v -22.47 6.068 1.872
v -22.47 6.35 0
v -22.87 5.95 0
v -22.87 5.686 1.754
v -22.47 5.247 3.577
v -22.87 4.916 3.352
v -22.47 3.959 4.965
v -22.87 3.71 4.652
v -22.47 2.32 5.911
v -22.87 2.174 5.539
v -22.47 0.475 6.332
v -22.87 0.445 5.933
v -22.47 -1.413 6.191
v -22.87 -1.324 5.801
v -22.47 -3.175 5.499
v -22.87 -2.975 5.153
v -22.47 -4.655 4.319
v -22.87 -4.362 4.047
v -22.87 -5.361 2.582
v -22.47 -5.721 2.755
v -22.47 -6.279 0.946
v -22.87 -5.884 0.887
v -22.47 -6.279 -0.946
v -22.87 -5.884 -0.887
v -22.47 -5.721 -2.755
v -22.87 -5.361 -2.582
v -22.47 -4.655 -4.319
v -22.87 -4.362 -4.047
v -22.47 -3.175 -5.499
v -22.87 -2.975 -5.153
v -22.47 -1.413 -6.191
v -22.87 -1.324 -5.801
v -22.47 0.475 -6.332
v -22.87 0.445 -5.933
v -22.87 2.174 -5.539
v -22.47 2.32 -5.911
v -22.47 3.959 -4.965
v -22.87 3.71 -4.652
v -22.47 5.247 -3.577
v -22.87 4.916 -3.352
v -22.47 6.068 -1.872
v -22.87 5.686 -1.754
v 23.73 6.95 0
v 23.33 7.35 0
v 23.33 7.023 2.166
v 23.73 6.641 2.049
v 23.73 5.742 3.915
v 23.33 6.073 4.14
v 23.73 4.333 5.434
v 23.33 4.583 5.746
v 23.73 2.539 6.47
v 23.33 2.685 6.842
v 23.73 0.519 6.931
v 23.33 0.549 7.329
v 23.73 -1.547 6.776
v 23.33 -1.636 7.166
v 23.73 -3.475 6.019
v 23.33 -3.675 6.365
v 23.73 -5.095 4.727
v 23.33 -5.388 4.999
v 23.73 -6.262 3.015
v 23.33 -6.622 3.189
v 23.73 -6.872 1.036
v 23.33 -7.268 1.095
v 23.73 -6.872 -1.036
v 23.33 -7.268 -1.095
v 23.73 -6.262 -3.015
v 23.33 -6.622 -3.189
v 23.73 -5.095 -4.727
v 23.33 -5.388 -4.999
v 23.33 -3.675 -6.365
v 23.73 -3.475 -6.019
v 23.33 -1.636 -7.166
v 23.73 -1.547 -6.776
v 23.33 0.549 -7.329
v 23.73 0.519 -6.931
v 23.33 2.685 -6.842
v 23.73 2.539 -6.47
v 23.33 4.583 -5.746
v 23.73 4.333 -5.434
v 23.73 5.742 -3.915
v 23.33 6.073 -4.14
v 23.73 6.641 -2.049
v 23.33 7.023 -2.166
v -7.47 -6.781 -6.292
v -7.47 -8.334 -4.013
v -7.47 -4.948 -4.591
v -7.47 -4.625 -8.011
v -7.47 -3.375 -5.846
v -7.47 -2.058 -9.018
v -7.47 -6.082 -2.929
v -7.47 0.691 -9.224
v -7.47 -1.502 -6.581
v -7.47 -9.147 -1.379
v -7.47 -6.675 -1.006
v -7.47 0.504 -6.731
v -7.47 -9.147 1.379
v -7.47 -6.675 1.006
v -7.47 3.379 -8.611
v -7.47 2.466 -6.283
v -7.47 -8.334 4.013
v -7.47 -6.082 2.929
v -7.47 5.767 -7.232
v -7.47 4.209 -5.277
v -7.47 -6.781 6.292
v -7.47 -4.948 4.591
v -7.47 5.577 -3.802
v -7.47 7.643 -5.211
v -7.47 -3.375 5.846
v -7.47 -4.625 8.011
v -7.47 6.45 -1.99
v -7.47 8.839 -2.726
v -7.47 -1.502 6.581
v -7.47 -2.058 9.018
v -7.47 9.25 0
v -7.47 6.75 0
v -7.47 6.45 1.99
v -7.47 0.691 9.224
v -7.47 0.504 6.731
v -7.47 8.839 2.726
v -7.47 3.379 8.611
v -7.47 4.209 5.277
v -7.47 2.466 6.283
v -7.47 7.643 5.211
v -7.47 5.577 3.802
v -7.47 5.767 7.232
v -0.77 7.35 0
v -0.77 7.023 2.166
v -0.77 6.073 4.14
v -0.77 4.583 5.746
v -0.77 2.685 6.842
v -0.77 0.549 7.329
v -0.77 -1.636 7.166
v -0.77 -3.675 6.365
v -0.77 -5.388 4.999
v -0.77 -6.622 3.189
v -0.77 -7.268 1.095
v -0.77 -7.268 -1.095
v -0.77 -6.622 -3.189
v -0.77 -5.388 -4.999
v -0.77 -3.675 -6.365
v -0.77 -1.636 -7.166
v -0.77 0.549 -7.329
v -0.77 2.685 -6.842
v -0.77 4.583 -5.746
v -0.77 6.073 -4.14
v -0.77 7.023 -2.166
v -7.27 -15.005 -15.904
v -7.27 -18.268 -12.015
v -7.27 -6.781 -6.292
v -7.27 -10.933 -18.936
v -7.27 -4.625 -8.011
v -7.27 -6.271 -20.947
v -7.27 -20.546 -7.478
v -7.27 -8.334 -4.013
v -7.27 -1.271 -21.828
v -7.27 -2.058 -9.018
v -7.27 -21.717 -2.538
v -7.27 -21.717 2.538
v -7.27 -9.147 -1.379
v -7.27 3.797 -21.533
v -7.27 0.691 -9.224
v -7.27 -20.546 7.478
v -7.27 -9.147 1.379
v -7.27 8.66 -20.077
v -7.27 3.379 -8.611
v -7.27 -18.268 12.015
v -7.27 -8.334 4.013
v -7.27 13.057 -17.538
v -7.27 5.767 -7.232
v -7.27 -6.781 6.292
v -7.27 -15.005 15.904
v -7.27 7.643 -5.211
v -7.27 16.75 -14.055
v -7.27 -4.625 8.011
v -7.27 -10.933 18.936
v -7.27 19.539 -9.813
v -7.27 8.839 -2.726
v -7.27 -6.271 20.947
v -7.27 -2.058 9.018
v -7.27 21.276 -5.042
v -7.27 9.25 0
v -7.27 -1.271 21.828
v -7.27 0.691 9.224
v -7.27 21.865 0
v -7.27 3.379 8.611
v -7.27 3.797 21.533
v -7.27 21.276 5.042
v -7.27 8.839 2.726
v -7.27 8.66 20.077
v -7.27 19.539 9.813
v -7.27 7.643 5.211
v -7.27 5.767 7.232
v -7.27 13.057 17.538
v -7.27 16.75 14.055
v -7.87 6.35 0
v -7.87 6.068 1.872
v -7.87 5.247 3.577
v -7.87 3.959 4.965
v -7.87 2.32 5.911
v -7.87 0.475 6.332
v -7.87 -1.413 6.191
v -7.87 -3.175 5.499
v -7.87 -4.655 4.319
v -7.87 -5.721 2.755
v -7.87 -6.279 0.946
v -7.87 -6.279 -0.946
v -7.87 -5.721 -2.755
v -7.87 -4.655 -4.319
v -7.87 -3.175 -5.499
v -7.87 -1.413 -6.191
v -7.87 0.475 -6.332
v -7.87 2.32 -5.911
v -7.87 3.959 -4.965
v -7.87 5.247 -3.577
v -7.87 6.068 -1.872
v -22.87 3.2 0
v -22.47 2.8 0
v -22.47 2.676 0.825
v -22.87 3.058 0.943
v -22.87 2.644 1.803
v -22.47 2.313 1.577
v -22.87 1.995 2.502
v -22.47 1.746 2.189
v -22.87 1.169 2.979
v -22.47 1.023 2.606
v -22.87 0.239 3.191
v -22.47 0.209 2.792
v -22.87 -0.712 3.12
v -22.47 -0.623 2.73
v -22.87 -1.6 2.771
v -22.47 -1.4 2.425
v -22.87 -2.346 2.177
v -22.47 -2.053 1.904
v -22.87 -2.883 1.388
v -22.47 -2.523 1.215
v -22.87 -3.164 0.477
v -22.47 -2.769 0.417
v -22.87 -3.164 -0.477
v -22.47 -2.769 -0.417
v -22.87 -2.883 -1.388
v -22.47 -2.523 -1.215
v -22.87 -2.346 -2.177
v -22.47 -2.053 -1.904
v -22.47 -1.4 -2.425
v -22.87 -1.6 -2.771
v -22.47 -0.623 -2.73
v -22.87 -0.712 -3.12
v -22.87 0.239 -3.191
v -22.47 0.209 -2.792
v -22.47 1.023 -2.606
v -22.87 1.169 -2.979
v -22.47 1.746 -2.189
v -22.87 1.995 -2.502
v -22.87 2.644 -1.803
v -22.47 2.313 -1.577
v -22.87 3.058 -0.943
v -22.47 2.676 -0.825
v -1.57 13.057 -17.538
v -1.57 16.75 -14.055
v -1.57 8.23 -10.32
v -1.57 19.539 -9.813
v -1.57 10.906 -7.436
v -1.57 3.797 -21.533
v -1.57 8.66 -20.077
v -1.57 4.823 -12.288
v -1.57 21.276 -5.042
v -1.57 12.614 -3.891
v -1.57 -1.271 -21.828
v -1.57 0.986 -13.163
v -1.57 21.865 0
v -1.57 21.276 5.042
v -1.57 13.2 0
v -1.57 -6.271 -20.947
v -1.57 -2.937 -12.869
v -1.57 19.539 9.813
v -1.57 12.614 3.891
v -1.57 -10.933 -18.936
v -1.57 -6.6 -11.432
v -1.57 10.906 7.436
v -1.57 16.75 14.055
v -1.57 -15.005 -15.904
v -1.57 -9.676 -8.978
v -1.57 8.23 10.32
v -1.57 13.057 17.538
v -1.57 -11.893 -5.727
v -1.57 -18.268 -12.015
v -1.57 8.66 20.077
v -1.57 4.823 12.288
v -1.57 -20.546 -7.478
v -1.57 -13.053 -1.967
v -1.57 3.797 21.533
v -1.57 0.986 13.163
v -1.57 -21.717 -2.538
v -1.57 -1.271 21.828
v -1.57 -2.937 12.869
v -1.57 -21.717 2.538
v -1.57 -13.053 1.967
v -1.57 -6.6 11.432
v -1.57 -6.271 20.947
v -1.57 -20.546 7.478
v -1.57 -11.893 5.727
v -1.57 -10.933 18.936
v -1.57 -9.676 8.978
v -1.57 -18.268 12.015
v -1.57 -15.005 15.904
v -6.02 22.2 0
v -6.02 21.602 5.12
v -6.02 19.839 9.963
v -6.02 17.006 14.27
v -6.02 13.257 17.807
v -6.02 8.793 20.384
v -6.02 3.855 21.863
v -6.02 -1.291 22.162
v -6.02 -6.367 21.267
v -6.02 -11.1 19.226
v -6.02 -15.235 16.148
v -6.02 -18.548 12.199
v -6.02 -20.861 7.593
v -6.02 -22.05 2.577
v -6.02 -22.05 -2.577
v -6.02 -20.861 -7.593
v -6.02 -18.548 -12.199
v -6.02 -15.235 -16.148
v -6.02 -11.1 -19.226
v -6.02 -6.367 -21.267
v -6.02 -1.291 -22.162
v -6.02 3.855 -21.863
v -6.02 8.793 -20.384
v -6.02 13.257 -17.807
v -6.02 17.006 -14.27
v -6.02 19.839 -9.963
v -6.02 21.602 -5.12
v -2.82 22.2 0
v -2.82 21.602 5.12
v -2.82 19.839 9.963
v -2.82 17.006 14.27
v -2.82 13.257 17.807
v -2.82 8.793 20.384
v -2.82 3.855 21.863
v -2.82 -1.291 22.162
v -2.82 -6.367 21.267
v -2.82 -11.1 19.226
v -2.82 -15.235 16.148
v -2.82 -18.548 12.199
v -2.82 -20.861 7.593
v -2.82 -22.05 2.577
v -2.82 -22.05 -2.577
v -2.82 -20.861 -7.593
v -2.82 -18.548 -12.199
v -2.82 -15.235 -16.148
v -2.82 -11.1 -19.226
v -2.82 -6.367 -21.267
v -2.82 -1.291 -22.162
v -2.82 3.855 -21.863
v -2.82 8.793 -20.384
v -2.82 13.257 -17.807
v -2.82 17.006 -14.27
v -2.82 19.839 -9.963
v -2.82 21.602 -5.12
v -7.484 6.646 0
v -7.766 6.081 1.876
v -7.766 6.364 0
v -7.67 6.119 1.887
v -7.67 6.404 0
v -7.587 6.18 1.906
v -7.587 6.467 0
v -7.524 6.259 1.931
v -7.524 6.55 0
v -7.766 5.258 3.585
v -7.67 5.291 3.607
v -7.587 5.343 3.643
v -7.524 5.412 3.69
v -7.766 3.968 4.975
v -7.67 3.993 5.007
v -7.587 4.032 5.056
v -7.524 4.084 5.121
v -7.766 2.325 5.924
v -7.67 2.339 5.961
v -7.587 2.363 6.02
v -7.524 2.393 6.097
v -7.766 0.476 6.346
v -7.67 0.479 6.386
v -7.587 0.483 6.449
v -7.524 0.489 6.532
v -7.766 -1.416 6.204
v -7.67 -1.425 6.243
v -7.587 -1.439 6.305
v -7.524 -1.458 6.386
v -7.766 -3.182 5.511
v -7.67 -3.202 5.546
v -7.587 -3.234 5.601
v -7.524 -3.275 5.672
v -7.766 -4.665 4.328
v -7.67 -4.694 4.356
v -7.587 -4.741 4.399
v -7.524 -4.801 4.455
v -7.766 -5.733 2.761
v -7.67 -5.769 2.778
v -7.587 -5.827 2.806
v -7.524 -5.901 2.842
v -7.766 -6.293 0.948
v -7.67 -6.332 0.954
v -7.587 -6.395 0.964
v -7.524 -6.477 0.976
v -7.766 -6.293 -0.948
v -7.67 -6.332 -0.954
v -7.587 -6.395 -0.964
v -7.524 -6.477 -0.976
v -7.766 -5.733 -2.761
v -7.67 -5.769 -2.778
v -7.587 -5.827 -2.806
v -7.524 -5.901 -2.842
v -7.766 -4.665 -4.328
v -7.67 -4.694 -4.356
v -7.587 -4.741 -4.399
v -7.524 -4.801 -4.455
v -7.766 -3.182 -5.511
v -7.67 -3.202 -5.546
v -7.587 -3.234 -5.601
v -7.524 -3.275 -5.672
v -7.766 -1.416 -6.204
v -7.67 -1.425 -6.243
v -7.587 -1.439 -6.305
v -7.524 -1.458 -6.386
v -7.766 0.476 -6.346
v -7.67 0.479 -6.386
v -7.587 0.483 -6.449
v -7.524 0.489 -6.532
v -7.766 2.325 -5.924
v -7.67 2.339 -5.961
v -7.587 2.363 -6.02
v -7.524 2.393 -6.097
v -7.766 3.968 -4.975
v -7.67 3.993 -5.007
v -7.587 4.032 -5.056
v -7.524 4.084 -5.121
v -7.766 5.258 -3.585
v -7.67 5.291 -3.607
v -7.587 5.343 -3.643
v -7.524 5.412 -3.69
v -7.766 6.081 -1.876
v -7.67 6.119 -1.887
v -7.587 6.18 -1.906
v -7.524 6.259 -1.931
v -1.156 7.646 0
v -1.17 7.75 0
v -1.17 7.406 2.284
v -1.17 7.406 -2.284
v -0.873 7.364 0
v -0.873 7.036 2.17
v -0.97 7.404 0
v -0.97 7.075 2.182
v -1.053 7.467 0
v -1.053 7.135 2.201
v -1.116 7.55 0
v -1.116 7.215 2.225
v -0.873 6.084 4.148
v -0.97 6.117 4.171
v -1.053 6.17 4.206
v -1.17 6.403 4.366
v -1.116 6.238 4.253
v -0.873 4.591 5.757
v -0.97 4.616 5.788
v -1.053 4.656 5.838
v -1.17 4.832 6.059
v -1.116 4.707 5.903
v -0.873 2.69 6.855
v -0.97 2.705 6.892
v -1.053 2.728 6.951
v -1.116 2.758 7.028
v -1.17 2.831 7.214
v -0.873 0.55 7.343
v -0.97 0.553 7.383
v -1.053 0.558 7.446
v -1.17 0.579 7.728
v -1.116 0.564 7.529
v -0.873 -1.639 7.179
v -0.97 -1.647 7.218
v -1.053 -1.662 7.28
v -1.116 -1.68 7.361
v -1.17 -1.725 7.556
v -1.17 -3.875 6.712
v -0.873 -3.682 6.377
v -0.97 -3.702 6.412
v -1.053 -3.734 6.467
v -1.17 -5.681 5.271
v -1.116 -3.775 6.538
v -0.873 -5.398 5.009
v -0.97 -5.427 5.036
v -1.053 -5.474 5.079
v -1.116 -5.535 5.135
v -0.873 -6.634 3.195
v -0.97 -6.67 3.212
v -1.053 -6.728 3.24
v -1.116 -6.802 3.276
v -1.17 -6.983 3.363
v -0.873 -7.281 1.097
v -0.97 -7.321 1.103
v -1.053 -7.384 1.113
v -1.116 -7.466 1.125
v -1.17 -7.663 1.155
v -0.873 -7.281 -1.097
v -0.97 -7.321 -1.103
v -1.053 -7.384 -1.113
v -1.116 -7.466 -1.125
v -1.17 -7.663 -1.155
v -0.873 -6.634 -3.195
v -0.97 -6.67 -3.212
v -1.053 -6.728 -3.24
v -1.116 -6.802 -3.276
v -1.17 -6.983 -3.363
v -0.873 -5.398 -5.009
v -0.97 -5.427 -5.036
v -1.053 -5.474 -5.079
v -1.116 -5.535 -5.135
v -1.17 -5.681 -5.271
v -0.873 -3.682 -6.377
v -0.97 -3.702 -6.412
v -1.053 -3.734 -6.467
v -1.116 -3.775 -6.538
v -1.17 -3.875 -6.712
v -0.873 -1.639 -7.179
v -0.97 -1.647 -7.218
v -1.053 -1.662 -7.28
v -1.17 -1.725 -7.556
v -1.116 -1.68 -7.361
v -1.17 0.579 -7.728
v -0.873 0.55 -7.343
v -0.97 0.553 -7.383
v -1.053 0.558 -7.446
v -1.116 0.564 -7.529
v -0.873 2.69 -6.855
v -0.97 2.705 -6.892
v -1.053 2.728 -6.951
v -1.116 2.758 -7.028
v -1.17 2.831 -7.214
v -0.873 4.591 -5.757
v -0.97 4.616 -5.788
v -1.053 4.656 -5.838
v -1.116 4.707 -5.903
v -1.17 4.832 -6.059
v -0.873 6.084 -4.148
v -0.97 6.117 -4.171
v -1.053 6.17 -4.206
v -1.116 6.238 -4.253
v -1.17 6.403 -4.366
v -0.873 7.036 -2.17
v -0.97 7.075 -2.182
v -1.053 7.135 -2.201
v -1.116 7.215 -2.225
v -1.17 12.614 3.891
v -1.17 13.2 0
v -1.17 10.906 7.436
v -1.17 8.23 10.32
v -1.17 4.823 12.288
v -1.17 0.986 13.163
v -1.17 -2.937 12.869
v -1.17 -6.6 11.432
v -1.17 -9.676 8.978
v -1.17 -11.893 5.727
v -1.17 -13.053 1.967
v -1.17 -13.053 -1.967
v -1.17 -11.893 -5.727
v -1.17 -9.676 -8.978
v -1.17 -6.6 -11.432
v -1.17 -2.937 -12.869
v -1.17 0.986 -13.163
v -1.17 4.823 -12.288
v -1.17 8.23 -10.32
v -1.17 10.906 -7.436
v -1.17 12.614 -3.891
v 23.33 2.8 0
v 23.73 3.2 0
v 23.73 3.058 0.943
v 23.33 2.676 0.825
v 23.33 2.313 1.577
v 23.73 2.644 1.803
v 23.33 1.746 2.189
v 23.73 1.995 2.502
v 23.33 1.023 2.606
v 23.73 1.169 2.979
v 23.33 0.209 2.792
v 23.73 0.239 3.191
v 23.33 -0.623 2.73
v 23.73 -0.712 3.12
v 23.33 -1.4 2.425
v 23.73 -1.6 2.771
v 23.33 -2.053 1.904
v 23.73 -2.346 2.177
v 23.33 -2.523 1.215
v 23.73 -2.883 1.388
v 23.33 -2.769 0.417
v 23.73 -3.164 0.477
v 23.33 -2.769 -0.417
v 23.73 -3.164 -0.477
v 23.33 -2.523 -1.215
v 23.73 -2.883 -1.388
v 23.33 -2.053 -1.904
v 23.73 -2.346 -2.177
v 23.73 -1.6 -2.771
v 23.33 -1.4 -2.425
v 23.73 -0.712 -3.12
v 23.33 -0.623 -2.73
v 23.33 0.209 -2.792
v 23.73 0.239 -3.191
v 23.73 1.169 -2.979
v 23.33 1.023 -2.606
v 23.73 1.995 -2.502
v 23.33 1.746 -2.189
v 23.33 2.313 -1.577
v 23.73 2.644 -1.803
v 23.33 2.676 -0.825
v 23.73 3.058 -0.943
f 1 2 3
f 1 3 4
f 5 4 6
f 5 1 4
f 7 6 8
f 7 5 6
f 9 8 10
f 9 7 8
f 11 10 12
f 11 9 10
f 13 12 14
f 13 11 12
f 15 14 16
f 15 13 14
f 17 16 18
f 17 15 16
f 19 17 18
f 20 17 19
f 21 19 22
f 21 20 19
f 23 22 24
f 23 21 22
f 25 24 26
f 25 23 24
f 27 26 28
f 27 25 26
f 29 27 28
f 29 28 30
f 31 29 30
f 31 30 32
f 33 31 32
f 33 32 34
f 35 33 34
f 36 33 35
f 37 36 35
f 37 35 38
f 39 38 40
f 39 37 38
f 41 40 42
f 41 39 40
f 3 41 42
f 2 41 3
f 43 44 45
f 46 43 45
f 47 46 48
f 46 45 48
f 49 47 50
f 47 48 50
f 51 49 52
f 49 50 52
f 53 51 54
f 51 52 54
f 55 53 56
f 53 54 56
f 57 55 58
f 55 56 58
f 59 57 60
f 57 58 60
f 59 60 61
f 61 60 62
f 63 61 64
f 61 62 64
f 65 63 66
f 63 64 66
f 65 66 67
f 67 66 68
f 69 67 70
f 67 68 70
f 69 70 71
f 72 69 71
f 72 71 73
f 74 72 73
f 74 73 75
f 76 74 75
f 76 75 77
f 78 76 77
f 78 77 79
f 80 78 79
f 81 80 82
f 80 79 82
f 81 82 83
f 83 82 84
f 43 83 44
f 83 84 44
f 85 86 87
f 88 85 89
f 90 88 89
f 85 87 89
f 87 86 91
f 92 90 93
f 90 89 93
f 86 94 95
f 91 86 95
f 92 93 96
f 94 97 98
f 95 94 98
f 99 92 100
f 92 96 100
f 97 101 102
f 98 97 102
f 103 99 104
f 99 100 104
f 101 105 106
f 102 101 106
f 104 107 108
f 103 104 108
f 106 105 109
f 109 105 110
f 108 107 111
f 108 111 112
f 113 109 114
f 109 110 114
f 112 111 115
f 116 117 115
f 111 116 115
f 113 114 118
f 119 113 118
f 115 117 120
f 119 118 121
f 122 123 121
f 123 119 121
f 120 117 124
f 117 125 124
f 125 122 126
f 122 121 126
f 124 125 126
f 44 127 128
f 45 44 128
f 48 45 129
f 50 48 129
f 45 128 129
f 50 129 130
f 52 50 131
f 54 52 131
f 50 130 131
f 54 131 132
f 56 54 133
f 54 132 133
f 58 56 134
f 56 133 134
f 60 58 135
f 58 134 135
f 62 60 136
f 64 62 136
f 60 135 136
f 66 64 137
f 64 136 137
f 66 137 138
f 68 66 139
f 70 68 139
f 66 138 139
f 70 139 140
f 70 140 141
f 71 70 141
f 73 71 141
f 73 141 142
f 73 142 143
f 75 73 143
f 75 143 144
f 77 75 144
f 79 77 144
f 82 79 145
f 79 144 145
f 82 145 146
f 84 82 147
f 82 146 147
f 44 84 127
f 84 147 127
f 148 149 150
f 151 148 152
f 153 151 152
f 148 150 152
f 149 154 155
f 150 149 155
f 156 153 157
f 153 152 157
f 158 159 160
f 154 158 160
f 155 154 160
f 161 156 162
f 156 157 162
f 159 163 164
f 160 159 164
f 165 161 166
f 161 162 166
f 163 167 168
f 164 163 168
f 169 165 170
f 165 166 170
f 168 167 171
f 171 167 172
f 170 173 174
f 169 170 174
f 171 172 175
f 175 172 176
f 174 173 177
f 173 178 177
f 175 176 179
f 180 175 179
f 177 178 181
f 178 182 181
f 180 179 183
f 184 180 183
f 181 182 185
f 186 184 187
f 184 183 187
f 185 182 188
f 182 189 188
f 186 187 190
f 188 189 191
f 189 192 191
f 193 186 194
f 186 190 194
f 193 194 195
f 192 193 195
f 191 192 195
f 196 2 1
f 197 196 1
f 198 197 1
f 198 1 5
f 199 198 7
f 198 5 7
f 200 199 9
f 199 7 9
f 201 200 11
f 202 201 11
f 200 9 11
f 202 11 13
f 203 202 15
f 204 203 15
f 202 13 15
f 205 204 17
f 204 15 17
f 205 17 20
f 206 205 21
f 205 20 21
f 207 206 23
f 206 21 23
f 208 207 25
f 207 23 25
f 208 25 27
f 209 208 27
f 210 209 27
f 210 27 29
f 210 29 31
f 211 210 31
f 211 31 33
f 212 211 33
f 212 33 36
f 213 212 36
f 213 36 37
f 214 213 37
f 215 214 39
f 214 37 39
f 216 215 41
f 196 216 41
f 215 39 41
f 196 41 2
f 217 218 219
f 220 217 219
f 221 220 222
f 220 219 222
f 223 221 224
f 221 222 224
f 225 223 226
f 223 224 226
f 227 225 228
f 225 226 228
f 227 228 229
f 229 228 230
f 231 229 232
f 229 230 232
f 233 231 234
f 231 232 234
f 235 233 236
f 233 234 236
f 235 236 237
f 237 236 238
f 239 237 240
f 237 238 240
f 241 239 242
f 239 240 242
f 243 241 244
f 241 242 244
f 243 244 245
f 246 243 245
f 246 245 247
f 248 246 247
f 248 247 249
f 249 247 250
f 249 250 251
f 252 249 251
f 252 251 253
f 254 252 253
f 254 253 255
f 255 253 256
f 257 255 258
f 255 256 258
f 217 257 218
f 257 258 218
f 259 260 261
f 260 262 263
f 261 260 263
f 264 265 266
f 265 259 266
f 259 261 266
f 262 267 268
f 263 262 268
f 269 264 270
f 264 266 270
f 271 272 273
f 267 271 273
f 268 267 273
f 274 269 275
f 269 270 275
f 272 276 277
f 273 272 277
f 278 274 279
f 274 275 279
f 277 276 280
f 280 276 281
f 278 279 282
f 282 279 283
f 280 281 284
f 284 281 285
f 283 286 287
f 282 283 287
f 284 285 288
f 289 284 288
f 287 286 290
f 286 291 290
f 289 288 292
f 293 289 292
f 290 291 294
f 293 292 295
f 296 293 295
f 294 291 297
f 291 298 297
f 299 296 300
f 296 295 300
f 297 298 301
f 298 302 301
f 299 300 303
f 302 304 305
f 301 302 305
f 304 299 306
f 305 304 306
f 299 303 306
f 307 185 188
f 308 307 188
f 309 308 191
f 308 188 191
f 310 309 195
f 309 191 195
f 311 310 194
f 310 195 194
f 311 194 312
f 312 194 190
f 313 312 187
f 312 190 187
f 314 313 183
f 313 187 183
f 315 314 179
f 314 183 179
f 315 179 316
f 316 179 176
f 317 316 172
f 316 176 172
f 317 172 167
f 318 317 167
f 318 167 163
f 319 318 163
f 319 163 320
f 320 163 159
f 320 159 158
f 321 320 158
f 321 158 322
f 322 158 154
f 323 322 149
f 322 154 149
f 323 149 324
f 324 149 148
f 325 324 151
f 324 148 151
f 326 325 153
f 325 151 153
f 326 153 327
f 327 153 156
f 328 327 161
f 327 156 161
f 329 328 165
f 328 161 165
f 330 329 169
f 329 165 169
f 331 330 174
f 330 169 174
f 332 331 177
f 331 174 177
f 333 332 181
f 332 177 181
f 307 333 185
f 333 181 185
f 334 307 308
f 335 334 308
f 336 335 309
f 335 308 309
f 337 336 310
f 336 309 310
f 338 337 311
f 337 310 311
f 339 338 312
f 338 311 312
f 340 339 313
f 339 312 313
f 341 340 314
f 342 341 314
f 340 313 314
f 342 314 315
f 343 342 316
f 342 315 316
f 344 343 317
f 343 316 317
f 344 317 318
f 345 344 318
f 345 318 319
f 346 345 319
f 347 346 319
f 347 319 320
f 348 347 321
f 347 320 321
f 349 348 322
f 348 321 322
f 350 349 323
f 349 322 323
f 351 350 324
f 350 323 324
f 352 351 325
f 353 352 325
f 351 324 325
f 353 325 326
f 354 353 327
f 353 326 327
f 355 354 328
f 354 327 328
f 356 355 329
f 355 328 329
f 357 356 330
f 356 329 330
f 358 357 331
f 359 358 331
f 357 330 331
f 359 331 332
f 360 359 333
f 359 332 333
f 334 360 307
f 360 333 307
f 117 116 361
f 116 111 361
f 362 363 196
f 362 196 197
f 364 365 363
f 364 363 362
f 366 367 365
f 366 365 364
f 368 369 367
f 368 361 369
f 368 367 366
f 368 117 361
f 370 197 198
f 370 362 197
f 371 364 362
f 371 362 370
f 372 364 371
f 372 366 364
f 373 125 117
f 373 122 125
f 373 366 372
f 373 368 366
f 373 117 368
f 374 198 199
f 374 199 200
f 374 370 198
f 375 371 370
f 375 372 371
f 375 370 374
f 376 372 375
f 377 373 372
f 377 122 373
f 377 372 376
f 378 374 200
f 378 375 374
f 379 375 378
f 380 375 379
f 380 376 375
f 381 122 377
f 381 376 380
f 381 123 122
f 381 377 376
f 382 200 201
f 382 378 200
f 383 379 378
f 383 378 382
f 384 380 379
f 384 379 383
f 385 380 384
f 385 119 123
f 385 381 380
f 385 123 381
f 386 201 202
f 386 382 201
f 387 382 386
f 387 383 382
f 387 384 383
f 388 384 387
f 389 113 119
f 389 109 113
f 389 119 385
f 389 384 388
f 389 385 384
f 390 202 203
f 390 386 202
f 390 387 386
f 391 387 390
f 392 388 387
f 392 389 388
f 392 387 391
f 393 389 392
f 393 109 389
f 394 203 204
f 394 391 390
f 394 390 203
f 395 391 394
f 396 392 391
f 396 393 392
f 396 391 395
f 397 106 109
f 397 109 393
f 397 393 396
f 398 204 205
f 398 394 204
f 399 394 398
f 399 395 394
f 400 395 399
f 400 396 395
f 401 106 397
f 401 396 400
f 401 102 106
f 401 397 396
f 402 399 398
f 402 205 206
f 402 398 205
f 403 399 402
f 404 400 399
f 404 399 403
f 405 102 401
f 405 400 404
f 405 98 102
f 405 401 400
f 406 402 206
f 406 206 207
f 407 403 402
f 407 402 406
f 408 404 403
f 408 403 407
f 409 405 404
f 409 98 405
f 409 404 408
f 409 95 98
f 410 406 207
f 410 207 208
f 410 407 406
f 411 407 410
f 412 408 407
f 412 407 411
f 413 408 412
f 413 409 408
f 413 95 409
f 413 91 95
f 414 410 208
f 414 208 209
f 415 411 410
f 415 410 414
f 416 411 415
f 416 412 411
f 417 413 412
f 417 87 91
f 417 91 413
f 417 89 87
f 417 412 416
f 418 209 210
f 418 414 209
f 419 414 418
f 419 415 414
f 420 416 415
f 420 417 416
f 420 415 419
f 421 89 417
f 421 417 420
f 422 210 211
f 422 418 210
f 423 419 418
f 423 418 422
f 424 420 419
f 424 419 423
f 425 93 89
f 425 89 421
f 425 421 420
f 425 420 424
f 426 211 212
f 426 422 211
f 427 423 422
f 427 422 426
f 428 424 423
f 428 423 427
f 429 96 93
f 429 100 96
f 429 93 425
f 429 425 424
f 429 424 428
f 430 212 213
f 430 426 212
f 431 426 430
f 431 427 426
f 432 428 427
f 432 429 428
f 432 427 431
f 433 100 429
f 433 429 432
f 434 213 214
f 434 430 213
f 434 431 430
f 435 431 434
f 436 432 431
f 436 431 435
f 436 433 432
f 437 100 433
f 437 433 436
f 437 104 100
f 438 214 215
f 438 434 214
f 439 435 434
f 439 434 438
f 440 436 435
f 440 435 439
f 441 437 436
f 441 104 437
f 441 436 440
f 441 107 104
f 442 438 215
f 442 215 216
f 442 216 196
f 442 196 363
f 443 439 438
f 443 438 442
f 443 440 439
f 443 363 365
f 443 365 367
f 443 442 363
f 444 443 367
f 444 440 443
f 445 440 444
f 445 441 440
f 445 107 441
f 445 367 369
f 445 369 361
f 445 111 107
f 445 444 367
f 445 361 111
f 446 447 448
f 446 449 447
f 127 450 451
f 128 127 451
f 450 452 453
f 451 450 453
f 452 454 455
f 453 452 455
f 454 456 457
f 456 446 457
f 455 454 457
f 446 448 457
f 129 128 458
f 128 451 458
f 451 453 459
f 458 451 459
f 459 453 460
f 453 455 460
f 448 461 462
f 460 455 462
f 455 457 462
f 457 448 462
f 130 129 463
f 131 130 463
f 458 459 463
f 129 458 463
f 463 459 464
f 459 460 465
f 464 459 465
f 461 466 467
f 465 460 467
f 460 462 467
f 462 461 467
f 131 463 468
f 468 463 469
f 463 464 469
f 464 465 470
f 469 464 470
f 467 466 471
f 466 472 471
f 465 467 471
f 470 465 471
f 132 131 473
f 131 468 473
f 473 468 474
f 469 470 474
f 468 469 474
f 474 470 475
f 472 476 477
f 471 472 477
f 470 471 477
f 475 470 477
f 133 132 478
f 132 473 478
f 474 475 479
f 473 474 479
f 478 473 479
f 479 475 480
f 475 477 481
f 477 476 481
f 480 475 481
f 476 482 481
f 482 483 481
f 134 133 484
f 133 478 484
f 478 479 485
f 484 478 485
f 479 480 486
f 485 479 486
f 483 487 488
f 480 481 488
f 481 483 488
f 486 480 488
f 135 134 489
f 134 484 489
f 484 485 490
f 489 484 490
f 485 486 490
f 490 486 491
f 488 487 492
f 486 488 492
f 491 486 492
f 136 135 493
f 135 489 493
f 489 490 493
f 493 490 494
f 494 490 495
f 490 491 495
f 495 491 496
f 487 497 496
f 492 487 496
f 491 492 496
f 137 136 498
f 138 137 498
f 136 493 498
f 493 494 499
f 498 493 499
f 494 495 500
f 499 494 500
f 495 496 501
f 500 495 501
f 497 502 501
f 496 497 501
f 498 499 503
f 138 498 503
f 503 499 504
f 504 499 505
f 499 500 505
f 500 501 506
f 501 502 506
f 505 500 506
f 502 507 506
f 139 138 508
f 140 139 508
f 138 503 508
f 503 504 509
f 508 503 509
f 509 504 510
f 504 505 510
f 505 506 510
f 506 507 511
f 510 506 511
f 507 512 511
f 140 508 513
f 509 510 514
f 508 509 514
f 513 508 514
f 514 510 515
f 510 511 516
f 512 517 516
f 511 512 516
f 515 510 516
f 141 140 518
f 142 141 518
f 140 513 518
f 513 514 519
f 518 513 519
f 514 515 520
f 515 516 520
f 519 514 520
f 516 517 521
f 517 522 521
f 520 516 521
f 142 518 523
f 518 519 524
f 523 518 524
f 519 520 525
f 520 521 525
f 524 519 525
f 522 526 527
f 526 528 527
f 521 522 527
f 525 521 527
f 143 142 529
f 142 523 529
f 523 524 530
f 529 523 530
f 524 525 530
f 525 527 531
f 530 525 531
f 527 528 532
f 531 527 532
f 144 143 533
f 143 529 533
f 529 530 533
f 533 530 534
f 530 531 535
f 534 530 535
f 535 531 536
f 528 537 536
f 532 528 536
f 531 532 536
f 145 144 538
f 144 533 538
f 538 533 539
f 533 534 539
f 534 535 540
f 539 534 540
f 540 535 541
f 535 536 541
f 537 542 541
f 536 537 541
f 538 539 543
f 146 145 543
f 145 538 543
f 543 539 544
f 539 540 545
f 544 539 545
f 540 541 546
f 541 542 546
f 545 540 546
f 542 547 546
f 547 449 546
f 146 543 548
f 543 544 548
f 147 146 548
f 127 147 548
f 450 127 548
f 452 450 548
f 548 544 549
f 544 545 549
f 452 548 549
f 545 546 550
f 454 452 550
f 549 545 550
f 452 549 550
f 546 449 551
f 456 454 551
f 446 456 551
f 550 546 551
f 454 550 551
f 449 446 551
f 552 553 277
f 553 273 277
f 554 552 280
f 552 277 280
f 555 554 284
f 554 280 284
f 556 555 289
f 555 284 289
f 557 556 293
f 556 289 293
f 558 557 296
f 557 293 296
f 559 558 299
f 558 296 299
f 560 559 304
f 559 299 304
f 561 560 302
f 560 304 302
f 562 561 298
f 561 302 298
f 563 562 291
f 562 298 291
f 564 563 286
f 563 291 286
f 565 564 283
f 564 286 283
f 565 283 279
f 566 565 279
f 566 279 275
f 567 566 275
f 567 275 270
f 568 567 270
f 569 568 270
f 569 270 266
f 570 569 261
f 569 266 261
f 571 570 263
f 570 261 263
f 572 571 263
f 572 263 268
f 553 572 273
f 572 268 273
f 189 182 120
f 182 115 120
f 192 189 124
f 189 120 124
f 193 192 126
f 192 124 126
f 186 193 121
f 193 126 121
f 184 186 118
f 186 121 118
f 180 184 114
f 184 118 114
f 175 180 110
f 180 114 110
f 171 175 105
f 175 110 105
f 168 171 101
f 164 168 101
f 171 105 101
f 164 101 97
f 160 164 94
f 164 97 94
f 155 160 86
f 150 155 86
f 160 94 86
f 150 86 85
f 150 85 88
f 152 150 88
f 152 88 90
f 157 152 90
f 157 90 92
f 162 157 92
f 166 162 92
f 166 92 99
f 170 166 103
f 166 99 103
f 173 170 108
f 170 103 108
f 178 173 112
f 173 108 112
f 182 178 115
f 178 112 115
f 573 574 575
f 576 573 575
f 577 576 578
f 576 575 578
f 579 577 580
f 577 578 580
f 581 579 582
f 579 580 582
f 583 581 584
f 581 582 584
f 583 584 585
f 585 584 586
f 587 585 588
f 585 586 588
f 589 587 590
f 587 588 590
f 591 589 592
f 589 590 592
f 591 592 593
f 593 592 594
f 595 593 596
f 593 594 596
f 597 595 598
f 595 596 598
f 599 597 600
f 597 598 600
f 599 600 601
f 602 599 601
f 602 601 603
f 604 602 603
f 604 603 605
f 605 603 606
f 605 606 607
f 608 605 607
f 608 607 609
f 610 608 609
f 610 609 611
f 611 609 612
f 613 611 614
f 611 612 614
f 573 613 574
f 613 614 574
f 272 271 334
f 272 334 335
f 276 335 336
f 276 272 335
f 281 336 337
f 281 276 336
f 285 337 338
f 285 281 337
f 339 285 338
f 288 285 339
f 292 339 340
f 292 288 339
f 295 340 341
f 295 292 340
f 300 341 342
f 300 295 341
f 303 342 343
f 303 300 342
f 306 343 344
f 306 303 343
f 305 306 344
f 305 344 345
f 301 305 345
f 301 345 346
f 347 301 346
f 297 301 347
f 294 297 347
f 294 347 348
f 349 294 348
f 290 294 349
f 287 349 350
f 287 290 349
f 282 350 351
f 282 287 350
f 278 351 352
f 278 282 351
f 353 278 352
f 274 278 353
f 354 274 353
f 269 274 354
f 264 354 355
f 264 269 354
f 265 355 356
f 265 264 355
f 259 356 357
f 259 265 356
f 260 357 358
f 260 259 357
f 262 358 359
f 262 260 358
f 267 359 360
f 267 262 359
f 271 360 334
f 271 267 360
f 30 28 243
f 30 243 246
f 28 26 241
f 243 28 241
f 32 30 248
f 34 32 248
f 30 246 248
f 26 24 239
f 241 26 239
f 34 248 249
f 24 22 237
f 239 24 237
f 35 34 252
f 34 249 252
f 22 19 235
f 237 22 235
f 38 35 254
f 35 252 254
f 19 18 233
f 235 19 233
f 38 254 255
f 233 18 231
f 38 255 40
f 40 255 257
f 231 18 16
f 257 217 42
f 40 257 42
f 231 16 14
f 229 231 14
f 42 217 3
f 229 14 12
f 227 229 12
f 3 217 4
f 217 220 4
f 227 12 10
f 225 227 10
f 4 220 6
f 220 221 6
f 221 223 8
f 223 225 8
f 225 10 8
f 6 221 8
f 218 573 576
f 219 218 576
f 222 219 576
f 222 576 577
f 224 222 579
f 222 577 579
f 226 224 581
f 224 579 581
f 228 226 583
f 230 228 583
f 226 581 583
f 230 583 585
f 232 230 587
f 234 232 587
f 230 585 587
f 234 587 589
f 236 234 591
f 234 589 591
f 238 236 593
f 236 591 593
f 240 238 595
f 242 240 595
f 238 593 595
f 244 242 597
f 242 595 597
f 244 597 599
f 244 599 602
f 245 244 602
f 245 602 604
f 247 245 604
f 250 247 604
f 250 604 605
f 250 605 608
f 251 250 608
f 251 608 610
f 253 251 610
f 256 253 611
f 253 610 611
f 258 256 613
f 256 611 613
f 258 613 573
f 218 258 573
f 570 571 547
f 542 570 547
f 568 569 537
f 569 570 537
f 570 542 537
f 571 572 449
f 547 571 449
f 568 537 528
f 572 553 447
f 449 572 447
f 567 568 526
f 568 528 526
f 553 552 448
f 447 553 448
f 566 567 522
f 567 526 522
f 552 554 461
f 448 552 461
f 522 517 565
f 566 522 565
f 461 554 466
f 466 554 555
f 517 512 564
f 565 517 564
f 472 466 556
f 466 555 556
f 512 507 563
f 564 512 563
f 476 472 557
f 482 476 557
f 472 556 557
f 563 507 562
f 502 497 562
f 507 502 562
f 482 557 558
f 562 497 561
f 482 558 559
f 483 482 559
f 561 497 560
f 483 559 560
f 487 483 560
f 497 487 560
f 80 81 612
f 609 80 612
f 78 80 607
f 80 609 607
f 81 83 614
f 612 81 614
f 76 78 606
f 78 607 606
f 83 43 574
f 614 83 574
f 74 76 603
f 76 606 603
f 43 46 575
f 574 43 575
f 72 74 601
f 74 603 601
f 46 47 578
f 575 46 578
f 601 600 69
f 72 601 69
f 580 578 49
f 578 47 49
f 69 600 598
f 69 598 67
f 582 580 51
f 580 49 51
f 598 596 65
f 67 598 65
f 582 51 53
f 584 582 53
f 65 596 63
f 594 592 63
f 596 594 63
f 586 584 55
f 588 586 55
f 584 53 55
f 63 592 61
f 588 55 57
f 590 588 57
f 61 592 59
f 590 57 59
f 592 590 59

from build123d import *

# Parameters (mm, degrees)
F2_SIZE  = 0.4
F3_R     = 0.4
F4_SIZE2 = 0.3349364905
F4_SIZE  = 1.25


with BuildPart() as f1:
    # F0 (on Top) → F1 (revolve)
    with BuildSketch(Plane.XY):
        Polygon((-22.8699422013, 6.35), (-22.8699422013, 2.8), (23.7300577987, 2.8), (23.7300577987, 7.35), (-1.1699422013, 7.35), (-1.1699422013, 13.2), (-1.5699422013, 13.2), (-1.5699422013, 22.2), (-7.2699422013, 22.2), (-7.2699422013, 9.25), (-7.4699422013, 9.25), (-7.4699422013, 6.35), align=None)
    revolve(axis=Axis((0.339884735, 0, 0), (1, 0, 0)))

    # F2
    f2_edges = [f1.edges().sort_by_distance(p)[0] for p in [
        (23.730058, -7.35, 0),
        (-22.869942, -6.35, 0),
        (-22.869942, -2.8, 0),
        (23.730058, -2.8, 0),
    ]]
    chamfer(f2_edges, length=F2_SIZE)

    # F3
    f3_edges = [f1.edges().sort_by_distance(p)[0] for p in [
        (-7.469942, -6.35, 0),
        (-1.169942, -7.35, 0),
    ]]
    fillet(f3_edges, radius=F3_R)

    # F4
    f4_edges = [f1.edges().sort_by_distance(p)[0] for p in [
        (-1.569942, -22.2, 0),
        (-7.269942, -22.2, 0),
    ]]
    f4_side = f1.faces().sort_by_distance((-4.419942, -22.2, 0))[0]
    chamfer(f4_edges, length=F4_SIZE, length2=F4_SIZE2, reference=f4_side)


solid = f1.part
